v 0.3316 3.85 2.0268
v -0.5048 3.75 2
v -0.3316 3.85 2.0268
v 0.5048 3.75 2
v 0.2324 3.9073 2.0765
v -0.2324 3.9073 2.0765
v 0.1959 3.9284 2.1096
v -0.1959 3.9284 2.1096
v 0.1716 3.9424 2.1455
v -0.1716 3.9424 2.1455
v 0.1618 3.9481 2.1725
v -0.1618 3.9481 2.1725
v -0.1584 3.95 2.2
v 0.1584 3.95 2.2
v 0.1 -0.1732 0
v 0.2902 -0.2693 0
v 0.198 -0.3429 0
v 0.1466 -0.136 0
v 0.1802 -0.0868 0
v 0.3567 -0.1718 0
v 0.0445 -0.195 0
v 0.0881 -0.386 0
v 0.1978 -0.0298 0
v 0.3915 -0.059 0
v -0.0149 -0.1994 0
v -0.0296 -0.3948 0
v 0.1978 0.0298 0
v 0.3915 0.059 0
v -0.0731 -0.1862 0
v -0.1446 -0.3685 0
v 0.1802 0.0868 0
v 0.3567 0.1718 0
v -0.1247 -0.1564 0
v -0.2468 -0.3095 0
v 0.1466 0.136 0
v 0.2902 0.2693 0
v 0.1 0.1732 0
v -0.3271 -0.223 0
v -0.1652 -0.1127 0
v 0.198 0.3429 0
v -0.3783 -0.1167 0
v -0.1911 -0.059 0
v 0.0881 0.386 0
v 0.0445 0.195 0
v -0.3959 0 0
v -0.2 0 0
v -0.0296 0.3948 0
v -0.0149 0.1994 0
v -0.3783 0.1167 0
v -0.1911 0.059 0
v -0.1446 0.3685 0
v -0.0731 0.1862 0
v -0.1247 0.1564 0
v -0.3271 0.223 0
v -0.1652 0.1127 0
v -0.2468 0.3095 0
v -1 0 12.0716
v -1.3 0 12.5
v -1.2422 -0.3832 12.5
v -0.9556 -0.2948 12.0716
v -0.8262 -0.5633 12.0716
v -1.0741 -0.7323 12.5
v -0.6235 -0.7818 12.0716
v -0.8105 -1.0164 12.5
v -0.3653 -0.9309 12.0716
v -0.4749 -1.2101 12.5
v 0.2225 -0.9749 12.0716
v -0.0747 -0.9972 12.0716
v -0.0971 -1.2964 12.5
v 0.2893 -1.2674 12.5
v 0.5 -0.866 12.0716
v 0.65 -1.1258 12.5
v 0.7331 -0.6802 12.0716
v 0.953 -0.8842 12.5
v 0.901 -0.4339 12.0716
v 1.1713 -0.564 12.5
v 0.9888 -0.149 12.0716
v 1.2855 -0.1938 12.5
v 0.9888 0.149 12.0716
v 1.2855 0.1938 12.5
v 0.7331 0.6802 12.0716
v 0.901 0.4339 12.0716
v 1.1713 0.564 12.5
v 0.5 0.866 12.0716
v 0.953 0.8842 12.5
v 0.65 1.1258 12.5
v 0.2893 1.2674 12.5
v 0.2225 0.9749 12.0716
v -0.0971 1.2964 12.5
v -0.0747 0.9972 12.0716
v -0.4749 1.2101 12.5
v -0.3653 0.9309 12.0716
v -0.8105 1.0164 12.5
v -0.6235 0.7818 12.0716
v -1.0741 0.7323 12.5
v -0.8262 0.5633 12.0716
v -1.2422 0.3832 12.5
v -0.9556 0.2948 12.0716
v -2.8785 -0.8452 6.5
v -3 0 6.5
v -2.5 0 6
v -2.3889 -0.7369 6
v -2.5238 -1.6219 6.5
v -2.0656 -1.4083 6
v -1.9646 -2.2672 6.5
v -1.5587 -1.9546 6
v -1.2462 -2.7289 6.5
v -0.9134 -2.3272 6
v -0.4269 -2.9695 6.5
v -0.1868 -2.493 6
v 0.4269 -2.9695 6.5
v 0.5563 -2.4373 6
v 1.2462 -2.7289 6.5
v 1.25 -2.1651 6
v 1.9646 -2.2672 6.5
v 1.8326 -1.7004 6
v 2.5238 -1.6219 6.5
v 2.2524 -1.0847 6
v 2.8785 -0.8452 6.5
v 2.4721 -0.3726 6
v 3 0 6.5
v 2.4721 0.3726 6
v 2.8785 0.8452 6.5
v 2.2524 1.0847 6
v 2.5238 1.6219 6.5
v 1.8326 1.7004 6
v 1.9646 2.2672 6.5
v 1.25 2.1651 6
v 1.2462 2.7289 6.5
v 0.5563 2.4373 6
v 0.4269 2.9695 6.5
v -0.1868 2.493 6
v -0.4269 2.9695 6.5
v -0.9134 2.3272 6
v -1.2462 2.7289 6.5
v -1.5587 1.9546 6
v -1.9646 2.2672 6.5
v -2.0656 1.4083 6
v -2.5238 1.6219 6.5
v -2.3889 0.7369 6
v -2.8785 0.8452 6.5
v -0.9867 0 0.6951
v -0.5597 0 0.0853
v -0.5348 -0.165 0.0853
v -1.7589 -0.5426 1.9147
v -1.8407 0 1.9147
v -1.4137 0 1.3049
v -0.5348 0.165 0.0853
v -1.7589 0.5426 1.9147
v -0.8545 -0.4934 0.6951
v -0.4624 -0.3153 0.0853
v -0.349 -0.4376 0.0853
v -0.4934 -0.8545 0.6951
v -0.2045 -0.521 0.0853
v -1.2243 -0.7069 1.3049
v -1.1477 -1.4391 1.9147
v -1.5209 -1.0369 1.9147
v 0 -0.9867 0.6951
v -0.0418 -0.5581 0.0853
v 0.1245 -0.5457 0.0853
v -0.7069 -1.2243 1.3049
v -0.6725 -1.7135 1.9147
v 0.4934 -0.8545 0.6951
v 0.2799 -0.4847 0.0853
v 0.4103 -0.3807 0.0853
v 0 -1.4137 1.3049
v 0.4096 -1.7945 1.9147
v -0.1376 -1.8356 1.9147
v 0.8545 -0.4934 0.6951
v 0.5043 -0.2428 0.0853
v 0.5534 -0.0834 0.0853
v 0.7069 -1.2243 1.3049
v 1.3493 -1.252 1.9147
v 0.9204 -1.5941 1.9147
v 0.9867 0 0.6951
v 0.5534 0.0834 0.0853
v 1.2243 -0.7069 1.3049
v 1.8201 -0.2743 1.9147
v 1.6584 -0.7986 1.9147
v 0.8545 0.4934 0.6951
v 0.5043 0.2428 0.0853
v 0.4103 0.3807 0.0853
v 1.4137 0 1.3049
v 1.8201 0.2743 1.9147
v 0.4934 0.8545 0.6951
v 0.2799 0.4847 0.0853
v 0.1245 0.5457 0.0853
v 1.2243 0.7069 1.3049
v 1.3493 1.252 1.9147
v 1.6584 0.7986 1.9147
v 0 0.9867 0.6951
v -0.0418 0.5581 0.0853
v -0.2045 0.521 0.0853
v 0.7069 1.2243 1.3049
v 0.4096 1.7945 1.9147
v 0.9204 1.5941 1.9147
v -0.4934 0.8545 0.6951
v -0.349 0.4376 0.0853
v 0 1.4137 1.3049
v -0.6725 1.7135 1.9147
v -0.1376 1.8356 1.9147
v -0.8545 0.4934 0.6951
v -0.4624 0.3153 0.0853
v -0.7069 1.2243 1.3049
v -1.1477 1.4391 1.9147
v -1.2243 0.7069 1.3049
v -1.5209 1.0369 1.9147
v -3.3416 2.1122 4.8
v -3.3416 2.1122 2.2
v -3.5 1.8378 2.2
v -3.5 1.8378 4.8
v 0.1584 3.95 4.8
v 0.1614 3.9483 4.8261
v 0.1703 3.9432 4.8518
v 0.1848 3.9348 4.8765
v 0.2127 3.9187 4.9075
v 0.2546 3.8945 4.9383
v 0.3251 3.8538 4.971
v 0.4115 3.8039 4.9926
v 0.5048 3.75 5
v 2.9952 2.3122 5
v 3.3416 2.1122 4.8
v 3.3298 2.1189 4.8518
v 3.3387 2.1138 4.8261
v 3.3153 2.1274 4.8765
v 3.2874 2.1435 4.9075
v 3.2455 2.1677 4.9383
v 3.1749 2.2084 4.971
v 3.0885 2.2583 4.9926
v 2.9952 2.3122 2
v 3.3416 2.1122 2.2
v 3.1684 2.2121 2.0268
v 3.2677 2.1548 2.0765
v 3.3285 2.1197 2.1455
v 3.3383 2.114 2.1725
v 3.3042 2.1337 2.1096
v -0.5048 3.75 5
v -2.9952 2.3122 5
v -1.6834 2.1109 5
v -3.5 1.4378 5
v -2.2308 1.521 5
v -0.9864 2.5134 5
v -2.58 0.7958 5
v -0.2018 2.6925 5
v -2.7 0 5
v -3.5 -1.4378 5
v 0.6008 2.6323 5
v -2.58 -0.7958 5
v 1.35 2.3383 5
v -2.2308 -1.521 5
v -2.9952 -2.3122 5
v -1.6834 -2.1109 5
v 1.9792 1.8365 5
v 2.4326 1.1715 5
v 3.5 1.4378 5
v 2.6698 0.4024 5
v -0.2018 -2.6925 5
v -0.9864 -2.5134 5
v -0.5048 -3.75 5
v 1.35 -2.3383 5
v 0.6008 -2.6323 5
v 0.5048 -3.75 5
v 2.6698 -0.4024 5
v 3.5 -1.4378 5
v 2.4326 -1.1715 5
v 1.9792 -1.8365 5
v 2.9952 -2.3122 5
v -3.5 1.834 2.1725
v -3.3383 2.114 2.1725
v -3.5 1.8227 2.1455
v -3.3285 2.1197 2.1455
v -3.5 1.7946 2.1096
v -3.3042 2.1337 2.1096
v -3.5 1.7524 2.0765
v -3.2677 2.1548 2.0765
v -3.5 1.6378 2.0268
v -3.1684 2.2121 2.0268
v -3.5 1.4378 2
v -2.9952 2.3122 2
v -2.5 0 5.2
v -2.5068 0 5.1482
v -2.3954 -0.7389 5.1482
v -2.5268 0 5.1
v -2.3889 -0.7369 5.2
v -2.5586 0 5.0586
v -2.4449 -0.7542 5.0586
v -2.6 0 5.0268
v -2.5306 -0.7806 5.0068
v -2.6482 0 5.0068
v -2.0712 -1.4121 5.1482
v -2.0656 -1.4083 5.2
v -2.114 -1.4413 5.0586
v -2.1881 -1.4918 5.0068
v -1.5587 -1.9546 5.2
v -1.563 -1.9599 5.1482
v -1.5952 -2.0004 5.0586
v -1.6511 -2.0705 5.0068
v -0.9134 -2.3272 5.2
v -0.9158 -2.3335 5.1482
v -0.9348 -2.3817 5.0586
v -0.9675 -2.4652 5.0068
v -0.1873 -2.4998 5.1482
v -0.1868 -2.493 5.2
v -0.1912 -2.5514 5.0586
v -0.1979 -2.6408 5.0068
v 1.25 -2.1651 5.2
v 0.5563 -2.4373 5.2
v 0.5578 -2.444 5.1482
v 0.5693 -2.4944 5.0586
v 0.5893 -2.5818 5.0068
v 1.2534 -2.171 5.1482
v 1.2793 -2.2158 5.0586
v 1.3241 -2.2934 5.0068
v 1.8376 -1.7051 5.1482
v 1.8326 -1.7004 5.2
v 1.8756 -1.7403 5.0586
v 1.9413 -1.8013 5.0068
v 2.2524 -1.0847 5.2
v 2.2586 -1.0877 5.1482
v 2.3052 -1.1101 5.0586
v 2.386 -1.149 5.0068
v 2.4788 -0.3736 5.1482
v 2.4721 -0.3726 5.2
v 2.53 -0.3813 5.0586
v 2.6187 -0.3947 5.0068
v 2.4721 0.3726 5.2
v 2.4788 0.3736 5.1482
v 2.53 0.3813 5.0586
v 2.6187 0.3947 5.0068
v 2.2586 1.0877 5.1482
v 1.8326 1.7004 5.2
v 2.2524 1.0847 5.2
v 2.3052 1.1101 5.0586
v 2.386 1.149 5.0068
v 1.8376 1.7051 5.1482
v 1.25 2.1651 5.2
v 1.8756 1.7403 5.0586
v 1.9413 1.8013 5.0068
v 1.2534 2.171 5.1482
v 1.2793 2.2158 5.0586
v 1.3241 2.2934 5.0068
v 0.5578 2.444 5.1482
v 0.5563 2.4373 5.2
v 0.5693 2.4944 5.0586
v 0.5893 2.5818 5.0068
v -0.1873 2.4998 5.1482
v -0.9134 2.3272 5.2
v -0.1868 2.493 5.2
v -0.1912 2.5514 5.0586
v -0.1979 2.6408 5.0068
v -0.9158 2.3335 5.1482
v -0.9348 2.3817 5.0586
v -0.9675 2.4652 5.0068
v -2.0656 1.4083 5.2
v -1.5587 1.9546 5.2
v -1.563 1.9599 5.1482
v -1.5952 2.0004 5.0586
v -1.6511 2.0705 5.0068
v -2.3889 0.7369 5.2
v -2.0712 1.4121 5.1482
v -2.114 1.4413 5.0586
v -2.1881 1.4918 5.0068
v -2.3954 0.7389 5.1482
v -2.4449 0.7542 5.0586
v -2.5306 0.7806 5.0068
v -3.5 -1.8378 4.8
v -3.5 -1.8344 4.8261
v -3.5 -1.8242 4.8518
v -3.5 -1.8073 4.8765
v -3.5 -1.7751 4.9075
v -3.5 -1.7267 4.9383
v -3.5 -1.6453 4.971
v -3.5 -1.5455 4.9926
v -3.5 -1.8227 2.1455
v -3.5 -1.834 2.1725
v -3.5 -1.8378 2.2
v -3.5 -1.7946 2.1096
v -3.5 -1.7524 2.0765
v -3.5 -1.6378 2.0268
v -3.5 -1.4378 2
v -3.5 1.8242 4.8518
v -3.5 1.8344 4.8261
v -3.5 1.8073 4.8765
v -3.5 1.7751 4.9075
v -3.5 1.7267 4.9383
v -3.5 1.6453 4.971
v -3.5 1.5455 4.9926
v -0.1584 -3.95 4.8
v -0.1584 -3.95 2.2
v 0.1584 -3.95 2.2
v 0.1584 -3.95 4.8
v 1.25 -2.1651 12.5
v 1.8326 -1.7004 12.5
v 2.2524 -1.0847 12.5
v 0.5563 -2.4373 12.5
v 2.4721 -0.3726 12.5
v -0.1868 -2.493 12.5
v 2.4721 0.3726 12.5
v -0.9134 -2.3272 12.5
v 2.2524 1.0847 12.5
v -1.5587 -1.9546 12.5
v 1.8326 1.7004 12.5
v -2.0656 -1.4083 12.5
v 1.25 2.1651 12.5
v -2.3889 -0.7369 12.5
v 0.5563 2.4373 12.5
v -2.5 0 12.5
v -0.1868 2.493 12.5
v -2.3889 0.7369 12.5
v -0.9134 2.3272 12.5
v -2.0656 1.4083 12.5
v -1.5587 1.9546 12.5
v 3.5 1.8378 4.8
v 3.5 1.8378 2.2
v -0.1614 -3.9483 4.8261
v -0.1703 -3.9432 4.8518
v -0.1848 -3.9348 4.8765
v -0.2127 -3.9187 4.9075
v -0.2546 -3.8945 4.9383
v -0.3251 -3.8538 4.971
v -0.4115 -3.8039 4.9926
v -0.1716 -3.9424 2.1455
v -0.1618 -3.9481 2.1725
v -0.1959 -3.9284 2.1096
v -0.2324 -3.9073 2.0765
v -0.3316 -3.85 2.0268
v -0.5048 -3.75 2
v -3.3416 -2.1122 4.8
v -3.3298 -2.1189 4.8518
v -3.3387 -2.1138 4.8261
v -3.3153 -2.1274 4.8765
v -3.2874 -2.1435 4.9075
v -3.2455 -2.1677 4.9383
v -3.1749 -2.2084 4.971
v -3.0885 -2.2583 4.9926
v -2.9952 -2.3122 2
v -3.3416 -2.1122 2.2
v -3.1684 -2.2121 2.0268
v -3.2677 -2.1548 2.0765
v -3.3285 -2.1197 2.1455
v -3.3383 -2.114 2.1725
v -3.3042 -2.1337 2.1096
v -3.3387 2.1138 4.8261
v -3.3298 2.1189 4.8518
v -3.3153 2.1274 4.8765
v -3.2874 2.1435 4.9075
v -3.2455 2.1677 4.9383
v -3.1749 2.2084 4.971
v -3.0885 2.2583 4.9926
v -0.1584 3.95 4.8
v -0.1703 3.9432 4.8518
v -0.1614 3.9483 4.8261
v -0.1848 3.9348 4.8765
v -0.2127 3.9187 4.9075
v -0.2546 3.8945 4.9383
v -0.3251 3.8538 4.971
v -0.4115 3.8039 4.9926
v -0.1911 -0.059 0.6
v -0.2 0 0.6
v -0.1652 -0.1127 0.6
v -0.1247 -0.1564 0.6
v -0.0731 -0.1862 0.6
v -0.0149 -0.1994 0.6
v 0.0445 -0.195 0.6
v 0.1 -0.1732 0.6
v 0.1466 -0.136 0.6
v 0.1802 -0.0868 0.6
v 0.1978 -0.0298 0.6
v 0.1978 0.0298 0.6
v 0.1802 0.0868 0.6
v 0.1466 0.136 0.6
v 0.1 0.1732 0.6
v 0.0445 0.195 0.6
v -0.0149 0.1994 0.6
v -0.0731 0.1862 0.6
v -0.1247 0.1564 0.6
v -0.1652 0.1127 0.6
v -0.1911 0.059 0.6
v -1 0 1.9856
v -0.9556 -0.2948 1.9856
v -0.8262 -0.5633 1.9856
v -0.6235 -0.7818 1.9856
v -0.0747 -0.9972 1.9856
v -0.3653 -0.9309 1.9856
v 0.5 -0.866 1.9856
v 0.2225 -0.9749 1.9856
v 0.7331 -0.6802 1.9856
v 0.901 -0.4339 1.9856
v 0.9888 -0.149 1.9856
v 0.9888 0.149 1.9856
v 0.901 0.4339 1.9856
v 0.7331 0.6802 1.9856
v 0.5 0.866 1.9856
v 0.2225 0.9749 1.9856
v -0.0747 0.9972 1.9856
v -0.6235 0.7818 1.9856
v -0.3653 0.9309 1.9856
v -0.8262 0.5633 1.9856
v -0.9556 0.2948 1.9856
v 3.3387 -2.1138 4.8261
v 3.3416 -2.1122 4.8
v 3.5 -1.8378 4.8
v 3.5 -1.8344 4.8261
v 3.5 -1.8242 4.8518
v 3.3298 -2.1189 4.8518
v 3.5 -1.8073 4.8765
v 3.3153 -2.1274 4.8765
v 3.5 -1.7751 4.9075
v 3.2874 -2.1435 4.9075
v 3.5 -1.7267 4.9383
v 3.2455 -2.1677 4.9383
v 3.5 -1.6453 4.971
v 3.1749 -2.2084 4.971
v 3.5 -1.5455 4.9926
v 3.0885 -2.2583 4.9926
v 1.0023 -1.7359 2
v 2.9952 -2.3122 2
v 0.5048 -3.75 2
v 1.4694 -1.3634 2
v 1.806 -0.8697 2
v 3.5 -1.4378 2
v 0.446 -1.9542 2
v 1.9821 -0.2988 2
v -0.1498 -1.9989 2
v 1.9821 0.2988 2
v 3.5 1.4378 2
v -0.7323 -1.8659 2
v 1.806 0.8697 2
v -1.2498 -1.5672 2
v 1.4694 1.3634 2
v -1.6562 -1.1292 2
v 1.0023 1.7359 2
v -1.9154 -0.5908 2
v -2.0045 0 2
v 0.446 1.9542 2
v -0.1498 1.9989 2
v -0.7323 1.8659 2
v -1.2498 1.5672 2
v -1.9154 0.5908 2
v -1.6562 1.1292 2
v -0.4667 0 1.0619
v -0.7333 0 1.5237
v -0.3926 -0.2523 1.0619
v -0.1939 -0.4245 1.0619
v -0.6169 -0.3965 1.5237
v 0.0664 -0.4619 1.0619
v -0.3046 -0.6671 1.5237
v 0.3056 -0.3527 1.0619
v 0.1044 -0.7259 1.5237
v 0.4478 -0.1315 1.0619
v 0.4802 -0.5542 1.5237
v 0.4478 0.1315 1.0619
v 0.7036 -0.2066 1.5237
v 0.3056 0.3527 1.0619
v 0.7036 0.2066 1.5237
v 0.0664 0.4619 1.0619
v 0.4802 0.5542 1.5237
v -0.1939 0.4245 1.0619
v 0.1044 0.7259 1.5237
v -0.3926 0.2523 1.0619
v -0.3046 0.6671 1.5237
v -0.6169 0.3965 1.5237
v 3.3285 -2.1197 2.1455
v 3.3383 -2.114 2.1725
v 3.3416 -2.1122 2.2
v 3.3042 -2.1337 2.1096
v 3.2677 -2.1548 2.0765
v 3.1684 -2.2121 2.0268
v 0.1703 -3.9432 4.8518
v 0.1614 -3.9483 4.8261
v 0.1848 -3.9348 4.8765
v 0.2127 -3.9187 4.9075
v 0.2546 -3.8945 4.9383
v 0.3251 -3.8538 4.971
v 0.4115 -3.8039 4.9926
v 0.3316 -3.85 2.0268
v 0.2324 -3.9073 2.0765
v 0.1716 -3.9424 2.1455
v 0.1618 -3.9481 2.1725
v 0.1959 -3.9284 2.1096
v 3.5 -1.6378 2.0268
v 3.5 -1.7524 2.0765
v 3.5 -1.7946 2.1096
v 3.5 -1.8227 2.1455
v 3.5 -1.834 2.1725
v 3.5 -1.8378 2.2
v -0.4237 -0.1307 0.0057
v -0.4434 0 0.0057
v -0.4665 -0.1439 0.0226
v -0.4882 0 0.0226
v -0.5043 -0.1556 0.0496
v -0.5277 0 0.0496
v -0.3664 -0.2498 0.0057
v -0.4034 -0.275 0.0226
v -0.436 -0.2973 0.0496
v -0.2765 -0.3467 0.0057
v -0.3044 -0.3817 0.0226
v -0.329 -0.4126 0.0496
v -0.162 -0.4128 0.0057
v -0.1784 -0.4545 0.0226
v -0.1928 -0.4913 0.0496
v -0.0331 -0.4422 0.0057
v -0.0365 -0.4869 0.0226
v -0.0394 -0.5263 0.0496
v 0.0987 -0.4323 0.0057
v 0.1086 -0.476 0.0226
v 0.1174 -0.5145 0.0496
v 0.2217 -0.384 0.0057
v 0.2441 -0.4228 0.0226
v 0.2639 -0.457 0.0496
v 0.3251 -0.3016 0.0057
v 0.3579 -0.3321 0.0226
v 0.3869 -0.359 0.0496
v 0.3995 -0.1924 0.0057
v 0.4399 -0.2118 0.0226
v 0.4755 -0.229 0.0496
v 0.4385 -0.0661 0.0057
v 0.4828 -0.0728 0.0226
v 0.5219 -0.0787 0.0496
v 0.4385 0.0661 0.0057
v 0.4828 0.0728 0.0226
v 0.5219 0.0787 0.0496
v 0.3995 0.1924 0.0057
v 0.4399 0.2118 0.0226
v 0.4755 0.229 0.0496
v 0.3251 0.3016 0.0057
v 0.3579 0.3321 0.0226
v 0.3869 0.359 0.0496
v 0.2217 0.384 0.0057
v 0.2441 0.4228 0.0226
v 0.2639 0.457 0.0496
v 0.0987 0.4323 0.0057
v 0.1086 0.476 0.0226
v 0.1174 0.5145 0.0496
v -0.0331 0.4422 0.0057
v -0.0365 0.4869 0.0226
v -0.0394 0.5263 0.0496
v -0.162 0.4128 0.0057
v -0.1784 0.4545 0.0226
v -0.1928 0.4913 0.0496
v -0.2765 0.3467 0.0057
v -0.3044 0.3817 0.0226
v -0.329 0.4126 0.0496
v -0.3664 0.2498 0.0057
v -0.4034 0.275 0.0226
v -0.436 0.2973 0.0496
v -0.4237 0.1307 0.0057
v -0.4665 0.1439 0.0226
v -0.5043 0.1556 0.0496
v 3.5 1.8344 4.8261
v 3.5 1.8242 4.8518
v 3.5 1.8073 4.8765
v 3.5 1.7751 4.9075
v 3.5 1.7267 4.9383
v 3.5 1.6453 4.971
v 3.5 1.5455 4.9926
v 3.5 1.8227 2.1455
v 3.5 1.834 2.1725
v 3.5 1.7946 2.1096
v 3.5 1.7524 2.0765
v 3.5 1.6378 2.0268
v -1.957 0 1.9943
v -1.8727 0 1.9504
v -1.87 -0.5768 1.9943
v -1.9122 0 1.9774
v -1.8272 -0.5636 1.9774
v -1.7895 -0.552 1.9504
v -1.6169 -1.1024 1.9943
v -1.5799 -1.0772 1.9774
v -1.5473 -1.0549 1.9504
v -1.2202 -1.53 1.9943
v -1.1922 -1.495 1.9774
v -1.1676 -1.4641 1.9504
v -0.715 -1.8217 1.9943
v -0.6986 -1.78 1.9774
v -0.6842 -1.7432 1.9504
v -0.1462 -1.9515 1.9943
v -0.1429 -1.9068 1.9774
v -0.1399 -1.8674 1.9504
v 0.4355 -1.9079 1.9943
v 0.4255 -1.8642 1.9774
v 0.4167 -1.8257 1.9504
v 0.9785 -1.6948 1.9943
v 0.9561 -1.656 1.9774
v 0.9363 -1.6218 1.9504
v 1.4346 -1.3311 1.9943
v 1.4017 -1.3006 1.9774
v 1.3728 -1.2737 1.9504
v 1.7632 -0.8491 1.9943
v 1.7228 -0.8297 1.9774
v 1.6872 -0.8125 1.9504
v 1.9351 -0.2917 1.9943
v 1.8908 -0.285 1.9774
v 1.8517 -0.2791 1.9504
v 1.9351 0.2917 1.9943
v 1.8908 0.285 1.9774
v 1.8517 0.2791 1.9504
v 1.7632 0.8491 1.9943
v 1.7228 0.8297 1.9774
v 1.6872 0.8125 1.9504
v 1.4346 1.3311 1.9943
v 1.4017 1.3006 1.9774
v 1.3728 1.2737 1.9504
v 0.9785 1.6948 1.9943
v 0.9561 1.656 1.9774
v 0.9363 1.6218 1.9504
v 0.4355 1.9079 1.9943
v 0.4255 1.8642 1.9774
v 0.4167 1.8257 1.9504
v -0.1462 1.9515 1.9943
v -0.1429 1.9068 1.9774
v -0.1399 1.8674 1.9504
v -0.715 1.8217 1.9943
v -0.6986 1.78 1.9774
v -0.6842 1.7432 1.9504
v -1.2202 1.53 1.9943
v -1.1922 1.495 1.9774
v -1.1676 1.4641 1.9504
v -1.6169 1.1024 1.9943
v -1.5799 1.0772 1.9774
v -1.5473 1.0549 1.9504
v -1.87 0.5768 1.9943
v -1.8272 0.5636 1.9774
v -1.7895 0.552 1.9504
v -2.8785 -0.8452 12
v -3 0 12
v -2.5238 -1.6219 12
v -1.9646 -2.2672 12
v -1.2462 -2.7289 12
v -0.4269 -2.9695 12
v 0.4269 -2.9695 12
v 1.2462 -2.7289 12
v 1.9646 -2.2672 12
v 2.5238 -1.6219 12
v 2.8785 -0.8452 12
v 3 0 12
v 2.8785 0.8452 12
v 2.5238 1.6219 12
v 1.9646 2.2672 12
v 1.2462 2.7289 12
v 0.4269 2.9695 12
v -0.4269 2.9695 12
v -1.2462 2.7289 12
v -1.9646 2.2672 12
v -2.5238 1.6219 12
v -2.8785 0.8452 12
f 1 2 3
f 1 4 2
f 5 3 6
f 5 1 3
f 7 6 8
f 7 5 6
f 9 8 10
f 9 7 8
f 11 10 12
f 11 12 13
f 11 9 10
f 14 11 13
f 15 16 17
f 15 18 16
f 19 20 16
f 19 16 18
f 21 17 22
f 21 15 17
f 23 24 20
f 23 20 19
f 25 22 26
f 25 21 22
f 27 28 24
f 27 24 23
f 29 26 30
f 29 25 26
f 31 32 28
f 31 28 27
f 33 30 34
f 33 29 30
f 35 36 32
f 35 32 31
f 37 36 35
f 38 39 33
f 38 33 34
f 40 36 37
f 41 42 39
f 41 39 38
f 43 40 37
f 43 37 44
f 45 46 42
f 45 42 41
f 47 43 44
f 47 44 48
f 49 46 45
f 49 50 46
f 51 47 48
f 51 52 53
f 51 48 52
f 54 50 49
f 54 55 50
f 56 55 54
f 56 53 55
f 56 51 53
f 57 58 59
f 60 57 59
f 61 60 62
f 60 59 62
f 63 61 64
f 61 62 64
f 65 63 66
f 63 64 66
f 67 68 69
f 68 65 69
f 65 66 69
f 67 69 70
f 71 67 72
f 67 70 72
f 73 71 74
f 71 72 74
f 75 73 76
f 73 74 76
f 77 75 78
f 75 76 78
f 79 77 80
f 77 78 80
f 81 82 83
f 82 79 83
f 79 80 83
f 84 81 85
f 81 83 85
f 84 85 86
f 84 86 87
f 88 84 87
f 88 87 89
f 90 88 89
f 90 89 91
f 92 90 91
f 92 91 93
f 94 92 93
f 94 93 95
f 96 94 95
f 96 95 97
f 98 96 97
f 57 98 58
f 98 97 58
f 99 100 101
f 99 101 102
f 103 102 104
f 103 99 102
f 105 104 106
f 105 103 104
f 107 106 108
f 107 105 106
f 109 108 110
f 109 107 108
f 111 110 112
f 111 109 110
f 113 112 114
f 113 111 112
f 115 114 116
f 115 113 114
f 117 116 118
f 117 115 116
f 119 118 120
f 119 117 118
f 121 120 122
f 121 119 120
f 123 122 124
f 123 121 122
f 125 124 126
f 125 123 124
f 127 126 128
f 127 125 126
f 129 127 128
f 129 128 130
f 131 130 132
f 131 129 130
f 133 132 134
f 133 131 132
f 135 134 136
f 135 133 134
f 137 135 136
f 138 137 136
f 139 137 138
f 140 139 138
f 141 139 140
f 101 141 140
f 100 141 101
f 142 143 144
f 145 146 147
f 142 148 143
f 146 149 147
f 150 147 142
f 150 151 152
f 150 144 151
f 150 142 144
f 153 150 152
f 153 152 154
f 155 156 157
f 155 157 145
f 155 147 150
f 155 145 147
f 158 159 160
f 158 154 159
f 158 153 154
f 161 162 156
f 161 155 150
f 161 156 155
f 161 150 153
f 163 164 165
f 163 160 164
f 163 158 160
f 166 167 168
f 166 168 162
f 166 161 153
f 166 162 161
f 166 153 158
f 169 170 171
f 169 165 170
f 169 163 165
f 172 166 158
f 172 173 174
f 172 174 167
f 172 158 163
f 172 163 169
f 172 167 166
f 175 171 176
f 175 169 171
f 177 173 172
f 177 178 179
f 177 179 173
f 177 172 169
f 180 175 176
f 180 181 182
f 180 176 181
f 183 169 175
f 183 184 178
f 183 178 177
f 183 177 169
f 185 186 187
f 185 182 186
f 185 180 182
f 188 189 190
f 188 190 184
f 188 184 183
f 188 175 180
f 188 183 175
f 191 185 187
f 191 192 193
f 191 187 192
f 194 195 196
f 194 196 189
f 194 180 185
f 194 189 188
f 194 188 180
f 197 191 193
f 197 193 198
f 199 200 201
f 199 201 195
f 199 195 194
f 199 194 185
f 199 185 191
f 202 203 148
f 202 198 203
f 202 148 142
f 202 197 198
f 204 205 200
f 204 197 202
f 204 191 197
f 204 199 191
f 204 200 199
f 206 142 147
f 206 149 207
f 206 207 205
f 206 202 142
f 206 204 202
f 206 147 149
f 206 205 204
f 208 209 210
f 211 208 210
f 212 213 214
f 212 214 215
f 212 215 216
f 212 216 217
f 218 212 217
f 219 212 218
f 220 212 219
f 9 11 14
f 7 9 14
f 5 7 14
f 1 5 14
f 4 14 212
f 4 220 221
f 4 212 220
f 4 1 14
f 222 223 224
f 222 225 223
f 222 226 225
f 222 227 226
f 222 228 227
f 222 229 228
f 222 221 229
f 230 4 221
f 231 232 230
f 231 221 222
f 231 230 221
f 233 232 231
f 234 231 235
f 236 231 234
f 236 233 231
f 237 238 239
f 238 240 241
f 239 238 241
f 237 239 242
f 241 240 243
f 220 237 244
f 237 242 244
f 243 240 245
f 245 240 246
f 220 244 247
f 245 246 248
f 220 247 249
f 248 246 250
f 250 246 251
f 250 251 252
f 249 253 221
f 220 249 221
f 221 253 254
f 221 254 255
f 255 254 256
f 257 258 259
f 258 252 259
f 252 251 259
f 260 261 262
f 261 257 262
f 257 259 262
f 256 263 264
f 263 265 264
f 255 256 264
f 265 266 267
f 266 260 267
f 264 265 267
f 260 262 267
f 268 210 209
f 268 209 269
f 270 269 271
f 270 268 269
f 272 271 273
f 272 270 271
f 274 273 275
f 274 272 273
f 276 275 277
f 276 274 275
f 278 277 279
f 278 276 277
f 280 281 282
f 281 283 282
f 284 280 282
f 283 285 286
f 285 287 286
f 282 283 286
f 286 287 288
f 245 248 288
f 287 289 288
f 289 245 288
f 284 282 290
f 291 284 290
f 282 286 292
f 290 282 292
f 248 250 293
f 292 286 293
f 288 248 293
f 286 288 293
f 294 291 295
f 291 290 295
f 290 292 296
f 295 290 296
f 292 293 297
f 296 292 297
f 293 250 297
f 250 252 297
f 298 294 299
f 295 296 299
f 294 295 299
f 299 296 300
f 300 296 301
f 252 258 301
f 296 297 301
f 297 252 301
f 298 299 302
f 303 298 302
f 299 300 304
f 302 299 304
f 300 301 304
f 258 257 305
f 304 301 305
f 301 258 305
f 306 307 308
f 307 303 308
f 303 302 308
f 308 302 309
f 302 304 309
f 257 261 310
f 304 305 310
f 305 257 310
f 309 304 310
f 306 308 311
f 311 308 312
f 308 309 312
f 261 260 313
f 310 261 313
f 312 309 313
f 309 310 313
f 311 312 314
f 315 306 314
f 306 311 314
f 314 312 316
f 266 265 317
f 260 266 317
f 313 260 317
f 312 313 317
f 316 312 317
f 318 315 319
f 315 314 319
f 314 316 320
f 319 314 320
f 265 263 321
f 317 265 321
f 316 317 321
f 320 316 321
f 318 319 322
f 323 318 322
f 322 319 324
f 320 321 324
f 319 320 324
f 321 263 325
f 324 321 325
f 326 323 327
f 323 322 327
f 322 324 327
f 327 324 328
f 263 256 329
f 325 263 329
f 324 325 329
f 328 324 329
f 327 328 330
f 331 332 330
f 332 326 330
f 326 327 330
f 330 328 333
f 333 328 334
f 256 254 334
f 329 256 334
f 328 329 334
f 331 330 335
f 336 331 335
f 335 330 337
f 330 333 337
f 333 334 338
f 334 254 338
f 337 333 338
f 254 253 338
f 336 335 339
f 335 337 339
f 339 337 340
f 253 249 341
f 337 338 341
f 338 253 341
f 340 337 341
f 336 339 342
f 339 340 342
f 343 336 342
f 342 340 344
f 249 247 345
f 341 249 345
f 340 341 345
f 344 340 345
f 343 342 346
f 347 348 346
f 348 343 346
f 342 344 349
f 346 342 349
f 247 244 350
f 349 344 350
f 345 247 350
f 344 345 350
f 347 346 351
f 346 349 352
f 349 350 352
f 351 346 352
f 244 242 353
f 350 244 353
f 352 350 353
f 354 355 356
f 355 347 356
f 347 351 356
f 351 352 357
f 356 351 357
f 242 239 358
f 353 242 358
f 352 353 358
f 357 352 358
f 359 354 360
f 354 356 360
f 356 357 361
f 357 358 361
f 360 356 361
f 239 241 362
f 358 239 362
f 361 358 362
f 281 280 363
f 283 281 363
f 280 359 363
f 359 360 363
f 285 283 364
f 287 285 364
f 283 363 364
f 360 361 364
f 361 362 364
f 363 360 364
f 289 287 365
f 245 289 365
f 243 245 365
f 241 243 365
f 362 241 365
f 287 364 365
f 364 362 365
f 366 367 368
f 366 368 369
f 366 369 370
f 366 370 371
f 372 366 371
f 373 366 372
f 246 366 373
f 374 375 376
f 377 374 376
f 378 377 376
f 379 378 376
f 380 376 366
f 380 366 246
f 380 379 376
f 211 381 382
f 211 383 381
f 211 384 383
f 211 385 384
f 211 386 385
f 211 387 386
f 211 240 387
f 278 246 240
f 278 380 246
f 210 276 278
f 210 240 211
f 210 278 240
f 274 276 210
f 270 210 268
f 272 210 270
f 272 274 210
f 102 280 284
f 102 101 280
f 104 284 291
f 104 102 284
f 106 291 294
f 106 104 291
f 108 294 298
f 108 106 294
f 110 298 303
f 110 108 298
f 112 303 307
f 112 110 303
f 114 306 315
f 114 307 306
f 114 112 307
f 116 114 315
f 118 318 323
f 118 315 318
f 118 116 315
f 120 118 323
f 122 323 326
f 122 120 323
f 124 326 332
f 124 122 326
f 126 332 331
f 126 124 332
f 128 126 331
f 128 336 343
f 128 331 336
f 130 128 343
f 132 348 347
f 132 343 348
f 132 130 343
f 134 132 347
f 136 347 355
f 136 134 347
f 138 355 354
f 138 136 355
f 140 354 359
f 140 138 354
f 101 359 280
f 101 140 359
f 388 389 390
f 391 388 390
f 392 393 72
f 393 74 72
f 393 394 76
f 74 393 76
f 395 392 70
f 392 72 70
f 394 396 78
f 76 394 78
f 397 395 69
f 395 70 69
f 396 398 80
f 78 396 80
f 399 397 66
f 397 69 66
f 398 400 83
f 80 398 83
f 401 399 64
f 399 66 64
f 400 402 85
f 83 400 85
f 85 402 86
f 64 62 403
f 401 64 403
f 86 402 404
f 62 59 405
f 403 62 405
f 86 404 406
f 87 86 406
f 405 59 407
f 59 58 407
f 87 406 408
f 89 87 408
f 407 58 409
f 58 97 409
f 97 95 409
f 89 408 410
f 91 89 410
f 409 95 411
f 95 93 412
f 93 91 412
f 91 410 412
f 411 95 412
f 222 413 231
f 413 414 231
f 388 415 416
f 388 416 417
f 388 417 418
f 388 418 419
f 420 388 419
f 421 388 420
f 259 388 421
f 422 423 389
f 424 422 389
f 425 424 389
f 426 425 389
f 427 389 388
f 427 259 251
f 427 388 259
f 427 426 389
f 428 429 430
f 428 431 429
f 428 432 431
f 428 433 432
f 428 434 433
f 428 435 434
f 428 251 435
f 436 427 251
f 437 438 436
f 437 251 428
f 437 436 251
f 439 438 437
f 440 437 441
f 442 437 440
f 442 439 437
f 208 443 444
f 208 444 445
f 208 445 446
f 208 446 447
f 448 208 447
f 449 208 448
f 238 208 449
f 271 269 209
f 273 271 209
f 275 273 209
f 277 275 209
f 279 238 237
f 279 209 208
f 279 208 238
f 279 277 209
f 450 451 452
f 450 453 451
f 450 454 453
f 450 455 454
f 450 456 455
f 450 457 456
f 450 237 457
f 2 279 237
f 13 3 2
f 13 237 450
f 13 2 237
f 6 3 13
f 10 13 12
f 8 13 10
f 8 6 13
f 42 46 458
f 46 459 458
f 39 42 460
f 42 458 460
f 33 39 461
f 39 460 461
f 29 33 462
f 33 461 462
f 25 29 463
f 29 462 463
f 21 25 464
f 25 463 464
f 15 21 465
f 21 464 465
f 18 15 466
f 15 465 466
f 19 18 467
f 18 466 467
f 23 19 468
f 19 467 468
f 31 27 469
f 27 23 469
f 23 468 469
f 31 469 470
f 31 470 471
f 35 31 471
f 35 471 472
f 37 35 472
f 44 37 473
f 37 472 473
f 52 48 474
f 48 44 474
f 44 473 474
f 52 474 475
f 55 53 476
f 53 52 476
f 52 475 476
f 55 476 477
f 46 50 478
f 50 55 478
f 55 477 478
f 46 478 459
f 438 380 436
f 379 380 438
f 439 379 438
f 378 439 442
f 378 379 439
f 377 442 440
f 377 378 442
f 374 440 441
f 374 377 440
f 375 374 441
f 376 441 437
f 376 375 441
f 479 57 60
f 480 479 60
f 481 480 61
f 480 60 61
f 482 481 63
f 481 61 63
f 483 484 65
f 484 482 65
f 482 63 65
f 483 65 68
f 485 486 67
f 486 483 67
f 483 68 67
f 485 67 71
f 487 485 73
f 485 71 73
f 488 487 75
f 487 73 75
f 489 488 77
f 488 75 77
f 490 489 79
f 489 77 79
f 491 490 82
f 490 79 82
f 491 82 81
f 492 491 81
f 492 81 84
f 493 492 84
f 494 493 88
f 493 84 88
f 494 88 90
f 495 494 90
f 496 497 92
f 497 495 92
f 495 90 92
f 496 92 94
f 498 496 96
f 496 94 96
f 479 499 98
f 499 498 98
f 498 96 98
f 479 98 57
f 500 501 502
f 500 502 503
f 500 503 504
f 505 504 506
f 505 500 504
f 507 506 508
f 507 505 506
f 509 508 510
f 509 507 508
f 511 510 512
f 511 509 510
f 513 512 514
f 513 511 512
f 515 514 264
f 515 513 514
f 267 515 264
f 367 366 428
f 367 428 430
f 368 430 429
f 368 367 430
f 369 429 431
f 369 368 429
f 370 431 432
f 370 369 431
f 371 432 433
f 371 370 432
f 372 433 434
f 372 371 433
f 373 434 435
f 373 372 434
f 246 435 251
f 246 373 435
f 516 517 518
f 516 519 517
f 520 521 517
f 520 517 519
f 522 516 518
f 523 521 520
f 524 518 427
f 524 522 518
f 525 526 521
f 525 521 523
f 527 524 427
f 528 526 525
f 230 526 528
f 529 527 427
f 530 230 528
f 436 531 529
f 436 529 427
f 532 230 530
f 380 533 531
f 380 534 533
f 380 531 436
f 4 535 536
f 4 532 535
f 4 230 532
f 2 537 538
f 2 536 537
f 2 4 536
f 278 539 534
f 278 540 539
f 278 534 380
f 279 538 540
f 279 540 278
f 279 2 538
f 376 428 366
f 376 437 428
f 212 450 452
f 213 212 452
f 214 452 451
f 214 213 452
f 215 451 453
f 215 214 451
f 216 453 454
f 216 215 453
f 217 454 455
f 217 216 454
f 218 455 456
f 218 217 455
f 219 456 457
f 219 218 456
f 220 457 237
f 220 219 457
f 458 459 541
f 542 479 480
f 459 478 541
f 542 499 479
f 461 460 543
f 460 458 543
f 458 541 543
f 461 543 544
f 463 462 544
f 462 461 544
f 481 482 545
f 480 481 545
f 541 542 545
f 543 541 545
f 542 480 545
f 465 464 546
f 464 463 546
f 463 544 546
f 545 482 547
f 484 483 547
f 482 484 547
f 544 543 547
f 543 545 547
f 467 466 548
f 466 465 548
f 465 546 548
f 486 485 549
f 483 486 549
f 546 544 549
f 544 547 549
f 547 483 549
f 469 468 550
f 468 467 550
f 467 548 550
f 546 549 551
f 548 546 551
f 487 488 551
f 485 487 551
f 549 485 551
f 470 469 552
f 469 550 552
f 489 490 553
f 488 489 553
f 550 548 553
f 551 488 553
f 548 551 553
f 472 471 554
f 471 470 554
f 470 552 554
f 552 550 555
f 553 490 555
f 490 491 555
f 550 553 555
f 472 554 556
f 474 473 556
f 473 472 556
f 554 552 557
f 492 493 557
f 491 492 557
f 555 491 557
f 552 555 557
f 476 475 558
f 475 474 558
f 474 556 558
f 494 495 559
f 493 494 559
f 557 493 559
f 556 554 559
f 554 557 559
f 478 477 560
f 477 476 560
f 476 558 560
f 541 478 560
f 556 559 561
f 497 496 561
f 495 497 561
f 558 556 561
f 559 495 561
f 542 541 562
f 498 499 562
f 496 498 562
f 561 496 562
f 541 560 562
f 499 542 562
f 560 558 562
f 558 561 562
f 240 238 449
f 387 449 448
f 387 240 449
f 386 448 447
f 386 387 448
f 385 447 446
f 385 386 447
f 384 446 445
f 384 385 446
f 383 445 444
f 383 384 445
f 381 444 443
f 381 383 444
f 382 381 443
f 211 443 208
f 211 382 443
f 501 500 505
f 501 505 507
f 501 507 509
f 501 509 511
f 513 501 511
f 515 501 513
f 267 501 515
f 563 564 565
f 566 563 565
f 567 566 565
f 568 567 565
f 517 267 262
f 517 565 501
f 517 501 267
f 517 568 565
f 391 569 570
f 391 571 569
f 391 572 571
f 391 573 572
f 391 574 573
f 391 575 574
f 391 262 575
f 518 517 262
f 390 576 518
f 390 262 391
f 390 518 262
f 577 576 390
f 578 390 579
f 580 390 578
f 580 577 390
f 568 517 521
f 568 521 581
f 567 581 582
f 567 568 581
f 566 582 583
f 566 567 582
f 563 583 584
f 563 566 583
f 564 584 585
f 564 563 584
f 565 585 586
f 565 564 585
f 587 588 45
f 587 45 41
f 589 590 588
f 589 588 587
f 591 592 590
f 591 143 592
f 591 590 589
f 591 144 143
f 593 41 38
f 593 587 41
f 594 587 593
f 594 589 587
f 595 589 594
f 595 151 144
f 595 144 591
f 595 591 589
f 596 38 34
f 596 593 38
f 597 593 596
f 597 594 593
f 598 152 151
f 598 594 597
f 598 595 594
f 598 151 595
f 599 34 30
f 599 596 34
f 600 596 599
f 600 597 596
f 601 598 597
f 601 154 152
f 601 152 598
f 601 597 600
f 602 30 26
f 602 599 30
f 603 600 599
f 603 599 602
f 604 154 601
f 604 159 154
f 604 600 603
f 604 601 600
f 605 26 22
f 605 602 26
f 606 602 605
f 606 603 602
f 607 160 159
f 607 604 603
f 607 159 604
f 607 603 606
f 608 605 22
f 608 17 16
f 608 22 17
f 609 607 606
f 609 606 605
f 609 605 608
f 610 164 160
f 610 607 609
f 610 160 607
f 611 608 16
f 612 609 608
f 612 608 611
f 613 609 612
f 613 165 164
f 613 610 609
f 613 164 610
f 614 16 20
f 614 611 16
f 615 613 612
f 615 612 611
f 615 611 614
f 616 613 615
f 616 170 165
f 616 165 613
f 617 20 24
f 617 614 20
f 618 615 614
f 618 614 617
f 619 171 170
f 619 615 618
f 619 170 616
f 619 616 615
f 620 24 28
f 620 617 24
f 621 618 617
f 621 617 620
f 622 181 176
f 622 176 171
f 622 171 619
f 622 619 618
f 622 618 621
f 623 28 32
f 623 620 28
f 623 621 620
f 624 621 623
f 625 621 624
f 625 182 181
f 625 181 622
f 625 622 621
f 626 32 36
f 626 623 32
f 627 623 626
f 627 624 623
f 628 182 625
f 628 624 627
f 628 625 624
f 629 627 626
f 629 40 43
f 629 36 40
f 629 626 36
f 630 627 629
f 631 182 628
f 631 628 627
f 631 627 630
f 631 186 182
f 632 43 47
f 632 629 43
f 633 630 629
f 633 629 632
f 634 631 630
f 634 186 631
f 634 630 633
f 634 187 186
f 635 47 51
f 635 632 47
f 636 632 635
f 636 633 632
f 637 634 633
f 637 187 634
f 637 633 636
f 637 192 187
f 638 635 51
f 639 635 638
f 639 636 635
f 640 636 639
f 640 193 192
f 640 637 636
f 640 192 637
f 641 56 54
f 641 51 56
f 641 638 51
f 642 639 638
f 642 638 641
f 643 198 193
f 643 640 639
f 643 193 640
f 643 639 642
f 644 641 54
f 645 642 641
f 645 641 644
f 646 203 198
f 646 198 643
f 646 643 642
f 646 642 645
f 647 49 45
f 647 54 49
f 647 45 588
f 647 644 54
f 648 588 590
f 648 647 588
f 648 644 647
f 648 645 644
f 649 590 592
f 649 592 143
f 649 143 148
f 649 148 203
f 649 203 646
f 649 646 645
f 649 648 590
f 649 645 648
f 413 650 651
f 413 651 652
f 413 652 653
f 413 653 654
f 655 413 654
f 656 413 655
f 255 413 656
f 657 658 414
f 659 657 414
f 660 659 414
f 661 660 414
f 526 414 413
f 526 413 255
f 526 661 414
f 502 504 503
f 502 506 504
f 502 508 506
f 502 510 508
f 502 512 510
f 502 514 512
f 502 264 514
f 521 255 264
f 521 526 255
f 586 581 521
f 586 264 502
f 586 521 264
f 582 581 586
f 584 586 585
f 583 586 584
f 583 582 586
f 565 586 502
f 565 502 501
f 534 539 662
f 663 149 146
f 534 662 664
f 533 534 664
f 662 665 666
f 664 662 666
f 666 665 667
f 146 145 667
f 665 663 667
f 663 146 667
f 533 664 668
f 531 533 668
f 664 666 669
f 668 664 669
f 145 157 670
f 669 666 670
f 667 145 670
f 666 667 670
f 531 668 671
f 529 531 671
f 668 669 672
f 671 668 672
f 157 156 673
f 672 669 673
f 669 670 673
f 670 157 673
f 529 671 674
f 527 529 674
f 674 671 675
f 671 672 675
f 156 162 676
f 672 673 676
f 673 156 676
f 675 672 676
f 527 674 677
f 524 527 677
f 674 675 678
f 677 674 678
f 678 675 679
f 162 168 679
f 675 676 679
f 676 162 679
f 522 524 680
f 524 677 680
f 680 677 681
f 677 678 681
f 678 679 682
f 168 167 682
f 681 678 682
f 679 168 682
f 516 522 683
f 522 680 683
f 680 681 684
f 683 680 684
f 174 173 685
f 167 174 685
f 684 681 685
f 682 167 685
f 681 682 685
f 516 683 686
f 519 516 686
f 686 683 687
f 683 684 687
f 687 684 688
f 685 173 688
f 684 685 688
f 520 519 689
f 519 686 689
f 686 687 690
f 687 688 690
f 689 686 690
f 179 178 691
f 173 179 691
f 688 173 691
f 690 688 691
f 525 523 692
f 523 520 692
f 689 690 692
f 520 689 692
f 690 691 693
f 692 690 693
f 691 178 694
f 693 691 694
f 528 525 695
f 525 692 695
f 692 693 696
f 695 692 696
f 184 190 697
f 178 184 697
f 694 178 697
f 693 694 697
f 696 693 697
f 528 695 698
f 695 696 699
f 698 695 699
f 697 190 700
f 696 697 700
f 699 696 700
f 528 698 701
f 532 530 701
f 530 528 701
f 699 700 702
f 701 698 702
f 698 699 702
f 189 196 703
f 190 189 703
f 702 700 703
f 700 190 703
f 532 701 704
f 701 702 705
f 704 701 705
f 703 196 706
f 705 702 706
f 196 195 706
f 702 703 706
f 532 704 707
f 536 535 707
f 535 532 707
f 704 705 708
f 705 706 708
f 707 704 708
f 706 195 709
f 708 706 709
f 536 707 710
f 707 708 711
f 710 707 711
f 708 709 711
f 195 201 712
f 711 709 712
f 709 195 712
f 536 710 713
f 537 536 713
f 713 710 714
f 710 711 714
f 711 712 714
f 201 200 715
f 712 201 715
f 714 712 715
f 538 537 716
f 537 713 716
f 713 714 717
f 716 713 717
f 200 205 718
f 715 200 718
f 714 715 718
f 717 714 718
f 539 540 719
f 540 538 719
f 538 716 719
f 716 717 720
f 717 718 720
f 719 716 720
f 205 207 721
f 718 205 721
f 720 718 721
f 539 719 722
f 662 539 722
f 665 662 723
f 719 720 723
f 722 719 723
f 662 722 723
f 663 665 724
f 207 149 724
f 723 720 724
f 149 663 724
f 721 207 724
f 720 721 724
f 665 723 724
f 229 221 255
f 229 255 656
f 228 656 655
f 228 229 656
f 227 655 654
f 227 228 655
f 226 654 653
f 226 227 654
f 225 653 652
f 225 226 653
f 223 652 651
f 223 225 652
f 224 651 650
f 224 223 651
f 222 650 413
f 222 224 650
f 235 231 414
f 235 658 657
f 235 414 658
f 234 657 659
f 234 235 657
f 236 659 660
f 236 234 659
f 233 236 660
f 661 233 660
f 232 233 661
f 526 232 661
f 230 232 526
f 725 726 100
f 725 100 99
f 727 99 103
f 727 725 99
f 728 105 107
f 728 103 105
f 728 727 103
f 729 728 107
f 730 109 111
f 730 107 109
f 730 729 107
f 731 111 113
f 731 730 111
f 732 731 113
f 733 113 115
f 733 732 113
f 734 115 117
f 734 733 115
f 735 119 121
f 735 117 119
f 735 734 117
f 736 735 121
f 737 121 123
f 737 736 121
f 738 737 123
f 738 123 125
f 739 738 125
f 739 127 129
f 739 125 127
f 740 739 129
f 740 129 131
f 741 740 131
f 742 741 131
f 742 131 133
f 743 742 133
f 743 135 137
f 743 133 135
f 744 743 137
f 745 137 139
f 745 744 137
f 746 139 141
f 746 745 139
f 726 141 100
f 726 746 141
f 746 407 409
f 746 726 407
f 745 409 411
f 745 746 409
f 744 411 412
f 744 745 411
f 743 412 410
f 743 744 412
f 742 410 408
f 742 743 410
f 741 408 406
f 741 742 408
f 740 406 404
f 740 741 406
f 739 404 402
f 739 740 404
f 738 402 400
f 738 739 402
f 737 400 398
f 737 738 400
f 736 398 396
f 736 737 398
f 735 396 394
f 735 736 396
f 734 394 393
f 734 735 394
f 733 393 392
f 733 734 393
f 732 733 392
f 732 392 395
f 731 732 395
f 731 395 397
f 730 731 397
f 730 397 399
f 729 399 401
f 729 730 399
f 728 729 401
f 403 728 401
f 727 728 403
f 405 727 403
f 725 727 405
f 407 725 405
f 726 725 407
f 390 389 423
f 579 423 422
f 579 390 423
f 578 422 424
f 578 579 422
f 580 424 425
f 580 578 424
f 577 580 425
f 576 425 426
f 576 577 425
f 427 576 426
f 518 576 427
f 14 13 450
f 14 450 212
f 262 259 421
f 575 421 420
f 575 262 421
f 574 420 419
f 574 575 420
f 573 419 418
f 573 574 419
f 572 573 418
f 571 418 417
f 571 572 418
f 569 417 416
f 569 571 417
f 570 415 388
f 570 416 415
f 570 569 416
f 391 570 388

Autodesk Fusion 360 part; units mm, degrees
sketch "Sketch1" plane through (0, 0, 0) normal (0, 1, 0) x (1, 0, 0)
  line L0 (-0.5, 0) -> (0.5, 0)
  line L1 (-0.2, 0) -> (-0.2, -0.6)
  line L2 (-0.2, -0.6) -> (-1, -1.9856)
  line L3 (-1, -1.9856) -> (-1, -12.0716)
  line L4 (-4.4259, -12.5) -> (0, -12.5)
  line L5 (0, -12.5) -> (0, 0)
  line L6 (-1, -12.0716) -> (-1.3, -12.5)
  line L7 (-1.3, -12.5) -> (-4.4259, -12.5)
  line L8 (-0.5, 0) -> (-1.8407, -1.9147)
  arc A0 (-0.3959, 0) -> (-0.5597, -0.0853) centre (-0.3959, -0.2) ccw
  line L9 (-2.0045, -2) -> (-3.5, -2)
  line L10 (-3.5, -2) -> (-3.5, -5)
  line L11 (-3.5, -5) -> (-2.7, -5)
  line L12 (-2.5, -5.2) -> (-2.5, -6)
  line L13 (-2.5, -6) -> (-3, -6.5)
  line L14 (-3, -6.5) -> (-3, -12)
  line L15 (-3, -12) -> (-2.5, -12.5)
  arc A1 (-2.0045, -2) -> (-1.8407, -1.9147) centre (-2.0045, -1.8) ccw
  arc A2 (-2.5, -5.2) -> (-2.7, -5) centre (-2.7, -5.2) ccw
  point P0 (-1.9004, -2)
  dimension "d3" = 0.2
  dimension "d5" = 30
  dimension "d10" = 12.5
  dimension "d11" = 1.3
  dimension "d12" = 1
  dimension "d14" = 125
  dimension "d15" = 0.6
  dimension "d16" = 1
  dimension "d17" = 0.2
  dimension "d18" = 2
  dimension "d19" = 3.5
  dimension "d20" = 5
  dimension "d21" = 2.5
  dimension "d24" = 3
  dimension "d25" = 135
  dimension "d26" = 135
  dimension "d27" = 0.5
  dimension "d28" = 1
  dimension "d29" = 0.2
  dimension "d38" = 0.2
revolve "Revolve1" add sketch "Sketch1" angle 360 about axis through (0, 0, 12.5) along (0, 0, -1) contours L0 L1 L2 L3 L4 L6 L7 L8 A0 L9 L10 L11 L12 L13 L14 L15 A1 A2
sketch "Sketch2" plane through (0, 0, 2) normal (0, 0, -1) x (1, 0, 0)
  circle A0 centre (0, 0) radius 3.5
  circle A1 centre (0, 0) radius 2.0045
  line L0 (-3.5, -2.0207) -> (0, -4.0415)
  line L1 (0, -4.0415) -> (3.5, -2.0207)
  line L2 (3.5, -2.0207) -> (3.5, 2.0207)
  line L3 (3.5, 2.0207) -> (0, 4.0415)
  line L4 (0, 4.0415) -> (-3.5, 2.0207)
  line L5 (-3.5, 2.0207) -> (-3.5, -2.0207)
  line L6 (-0.1584, 3.95) -> (0.1584, 3.95)
  line L7 (-0.1584, -3.95) -> (0.1584, -3.95)
  line L8 (0, 3.95) -> (0, -3.95) construction
  line L9 (-3.3416, -2.1122) -> (-3.5, -1.8378)
  line L10 (3.5, 1.8378) -> (3.3416, 2.1122)
  line L11 (3.5, -1.8378) -> (3.3416, -2.1122)
  line L12 (-3.3416, 2.1122) -> (-3.5, 1.8378)
  dimension "d31" = 7.9
  dimension "d33" = 360
extrude "Extrude1" add sketch "Sketch2" against normal up to surface (3 mm away) contours A0 L1 L2 L11 | A0 L2 L3 L10 | A0 L3 L4 L6 | A0 L0 L1 L7 | A0 L4 L5 L12 | A0 L0 L5 L9
fillet "Fillet1" radius 0.2 12 edges at (3.4208, -1.975, 2) (3.4208, -1.975, 5) (0, -3.95, 5) (0, -3.95, 2) (-3.4208, -1.975, 2) (-3.4208, -1.975, 5) (-3.4208, 1.975, 5) (-3.4208, 1.975, 2) (0, 3.95, 5) (0, 3.95, 2) (3.4208, 1.975, 2) (3.4208, 1.975, 5)
equation "Table_D = 2 mm"
equation "d3 = Nozzle_Diameter / 2"
equation "Nozzle_Diameter = 0.4 mm"
equation "Table_C = 0.6 mm"
equation "Table_B = 1 mm"
equation "Table_F = 0.2 mm"
equation "Table_E = 2.6 mm"
equation "d11 = Table_E / 2"
equation "d12 = Table_D / 2"
equation "d15 = Table_C"
equation "d16 = Table_B"
equation "d17 = Table_F"
equation "d26 = d25"
equation "d29 = Table_F"
equation "d37 = Table_F"
